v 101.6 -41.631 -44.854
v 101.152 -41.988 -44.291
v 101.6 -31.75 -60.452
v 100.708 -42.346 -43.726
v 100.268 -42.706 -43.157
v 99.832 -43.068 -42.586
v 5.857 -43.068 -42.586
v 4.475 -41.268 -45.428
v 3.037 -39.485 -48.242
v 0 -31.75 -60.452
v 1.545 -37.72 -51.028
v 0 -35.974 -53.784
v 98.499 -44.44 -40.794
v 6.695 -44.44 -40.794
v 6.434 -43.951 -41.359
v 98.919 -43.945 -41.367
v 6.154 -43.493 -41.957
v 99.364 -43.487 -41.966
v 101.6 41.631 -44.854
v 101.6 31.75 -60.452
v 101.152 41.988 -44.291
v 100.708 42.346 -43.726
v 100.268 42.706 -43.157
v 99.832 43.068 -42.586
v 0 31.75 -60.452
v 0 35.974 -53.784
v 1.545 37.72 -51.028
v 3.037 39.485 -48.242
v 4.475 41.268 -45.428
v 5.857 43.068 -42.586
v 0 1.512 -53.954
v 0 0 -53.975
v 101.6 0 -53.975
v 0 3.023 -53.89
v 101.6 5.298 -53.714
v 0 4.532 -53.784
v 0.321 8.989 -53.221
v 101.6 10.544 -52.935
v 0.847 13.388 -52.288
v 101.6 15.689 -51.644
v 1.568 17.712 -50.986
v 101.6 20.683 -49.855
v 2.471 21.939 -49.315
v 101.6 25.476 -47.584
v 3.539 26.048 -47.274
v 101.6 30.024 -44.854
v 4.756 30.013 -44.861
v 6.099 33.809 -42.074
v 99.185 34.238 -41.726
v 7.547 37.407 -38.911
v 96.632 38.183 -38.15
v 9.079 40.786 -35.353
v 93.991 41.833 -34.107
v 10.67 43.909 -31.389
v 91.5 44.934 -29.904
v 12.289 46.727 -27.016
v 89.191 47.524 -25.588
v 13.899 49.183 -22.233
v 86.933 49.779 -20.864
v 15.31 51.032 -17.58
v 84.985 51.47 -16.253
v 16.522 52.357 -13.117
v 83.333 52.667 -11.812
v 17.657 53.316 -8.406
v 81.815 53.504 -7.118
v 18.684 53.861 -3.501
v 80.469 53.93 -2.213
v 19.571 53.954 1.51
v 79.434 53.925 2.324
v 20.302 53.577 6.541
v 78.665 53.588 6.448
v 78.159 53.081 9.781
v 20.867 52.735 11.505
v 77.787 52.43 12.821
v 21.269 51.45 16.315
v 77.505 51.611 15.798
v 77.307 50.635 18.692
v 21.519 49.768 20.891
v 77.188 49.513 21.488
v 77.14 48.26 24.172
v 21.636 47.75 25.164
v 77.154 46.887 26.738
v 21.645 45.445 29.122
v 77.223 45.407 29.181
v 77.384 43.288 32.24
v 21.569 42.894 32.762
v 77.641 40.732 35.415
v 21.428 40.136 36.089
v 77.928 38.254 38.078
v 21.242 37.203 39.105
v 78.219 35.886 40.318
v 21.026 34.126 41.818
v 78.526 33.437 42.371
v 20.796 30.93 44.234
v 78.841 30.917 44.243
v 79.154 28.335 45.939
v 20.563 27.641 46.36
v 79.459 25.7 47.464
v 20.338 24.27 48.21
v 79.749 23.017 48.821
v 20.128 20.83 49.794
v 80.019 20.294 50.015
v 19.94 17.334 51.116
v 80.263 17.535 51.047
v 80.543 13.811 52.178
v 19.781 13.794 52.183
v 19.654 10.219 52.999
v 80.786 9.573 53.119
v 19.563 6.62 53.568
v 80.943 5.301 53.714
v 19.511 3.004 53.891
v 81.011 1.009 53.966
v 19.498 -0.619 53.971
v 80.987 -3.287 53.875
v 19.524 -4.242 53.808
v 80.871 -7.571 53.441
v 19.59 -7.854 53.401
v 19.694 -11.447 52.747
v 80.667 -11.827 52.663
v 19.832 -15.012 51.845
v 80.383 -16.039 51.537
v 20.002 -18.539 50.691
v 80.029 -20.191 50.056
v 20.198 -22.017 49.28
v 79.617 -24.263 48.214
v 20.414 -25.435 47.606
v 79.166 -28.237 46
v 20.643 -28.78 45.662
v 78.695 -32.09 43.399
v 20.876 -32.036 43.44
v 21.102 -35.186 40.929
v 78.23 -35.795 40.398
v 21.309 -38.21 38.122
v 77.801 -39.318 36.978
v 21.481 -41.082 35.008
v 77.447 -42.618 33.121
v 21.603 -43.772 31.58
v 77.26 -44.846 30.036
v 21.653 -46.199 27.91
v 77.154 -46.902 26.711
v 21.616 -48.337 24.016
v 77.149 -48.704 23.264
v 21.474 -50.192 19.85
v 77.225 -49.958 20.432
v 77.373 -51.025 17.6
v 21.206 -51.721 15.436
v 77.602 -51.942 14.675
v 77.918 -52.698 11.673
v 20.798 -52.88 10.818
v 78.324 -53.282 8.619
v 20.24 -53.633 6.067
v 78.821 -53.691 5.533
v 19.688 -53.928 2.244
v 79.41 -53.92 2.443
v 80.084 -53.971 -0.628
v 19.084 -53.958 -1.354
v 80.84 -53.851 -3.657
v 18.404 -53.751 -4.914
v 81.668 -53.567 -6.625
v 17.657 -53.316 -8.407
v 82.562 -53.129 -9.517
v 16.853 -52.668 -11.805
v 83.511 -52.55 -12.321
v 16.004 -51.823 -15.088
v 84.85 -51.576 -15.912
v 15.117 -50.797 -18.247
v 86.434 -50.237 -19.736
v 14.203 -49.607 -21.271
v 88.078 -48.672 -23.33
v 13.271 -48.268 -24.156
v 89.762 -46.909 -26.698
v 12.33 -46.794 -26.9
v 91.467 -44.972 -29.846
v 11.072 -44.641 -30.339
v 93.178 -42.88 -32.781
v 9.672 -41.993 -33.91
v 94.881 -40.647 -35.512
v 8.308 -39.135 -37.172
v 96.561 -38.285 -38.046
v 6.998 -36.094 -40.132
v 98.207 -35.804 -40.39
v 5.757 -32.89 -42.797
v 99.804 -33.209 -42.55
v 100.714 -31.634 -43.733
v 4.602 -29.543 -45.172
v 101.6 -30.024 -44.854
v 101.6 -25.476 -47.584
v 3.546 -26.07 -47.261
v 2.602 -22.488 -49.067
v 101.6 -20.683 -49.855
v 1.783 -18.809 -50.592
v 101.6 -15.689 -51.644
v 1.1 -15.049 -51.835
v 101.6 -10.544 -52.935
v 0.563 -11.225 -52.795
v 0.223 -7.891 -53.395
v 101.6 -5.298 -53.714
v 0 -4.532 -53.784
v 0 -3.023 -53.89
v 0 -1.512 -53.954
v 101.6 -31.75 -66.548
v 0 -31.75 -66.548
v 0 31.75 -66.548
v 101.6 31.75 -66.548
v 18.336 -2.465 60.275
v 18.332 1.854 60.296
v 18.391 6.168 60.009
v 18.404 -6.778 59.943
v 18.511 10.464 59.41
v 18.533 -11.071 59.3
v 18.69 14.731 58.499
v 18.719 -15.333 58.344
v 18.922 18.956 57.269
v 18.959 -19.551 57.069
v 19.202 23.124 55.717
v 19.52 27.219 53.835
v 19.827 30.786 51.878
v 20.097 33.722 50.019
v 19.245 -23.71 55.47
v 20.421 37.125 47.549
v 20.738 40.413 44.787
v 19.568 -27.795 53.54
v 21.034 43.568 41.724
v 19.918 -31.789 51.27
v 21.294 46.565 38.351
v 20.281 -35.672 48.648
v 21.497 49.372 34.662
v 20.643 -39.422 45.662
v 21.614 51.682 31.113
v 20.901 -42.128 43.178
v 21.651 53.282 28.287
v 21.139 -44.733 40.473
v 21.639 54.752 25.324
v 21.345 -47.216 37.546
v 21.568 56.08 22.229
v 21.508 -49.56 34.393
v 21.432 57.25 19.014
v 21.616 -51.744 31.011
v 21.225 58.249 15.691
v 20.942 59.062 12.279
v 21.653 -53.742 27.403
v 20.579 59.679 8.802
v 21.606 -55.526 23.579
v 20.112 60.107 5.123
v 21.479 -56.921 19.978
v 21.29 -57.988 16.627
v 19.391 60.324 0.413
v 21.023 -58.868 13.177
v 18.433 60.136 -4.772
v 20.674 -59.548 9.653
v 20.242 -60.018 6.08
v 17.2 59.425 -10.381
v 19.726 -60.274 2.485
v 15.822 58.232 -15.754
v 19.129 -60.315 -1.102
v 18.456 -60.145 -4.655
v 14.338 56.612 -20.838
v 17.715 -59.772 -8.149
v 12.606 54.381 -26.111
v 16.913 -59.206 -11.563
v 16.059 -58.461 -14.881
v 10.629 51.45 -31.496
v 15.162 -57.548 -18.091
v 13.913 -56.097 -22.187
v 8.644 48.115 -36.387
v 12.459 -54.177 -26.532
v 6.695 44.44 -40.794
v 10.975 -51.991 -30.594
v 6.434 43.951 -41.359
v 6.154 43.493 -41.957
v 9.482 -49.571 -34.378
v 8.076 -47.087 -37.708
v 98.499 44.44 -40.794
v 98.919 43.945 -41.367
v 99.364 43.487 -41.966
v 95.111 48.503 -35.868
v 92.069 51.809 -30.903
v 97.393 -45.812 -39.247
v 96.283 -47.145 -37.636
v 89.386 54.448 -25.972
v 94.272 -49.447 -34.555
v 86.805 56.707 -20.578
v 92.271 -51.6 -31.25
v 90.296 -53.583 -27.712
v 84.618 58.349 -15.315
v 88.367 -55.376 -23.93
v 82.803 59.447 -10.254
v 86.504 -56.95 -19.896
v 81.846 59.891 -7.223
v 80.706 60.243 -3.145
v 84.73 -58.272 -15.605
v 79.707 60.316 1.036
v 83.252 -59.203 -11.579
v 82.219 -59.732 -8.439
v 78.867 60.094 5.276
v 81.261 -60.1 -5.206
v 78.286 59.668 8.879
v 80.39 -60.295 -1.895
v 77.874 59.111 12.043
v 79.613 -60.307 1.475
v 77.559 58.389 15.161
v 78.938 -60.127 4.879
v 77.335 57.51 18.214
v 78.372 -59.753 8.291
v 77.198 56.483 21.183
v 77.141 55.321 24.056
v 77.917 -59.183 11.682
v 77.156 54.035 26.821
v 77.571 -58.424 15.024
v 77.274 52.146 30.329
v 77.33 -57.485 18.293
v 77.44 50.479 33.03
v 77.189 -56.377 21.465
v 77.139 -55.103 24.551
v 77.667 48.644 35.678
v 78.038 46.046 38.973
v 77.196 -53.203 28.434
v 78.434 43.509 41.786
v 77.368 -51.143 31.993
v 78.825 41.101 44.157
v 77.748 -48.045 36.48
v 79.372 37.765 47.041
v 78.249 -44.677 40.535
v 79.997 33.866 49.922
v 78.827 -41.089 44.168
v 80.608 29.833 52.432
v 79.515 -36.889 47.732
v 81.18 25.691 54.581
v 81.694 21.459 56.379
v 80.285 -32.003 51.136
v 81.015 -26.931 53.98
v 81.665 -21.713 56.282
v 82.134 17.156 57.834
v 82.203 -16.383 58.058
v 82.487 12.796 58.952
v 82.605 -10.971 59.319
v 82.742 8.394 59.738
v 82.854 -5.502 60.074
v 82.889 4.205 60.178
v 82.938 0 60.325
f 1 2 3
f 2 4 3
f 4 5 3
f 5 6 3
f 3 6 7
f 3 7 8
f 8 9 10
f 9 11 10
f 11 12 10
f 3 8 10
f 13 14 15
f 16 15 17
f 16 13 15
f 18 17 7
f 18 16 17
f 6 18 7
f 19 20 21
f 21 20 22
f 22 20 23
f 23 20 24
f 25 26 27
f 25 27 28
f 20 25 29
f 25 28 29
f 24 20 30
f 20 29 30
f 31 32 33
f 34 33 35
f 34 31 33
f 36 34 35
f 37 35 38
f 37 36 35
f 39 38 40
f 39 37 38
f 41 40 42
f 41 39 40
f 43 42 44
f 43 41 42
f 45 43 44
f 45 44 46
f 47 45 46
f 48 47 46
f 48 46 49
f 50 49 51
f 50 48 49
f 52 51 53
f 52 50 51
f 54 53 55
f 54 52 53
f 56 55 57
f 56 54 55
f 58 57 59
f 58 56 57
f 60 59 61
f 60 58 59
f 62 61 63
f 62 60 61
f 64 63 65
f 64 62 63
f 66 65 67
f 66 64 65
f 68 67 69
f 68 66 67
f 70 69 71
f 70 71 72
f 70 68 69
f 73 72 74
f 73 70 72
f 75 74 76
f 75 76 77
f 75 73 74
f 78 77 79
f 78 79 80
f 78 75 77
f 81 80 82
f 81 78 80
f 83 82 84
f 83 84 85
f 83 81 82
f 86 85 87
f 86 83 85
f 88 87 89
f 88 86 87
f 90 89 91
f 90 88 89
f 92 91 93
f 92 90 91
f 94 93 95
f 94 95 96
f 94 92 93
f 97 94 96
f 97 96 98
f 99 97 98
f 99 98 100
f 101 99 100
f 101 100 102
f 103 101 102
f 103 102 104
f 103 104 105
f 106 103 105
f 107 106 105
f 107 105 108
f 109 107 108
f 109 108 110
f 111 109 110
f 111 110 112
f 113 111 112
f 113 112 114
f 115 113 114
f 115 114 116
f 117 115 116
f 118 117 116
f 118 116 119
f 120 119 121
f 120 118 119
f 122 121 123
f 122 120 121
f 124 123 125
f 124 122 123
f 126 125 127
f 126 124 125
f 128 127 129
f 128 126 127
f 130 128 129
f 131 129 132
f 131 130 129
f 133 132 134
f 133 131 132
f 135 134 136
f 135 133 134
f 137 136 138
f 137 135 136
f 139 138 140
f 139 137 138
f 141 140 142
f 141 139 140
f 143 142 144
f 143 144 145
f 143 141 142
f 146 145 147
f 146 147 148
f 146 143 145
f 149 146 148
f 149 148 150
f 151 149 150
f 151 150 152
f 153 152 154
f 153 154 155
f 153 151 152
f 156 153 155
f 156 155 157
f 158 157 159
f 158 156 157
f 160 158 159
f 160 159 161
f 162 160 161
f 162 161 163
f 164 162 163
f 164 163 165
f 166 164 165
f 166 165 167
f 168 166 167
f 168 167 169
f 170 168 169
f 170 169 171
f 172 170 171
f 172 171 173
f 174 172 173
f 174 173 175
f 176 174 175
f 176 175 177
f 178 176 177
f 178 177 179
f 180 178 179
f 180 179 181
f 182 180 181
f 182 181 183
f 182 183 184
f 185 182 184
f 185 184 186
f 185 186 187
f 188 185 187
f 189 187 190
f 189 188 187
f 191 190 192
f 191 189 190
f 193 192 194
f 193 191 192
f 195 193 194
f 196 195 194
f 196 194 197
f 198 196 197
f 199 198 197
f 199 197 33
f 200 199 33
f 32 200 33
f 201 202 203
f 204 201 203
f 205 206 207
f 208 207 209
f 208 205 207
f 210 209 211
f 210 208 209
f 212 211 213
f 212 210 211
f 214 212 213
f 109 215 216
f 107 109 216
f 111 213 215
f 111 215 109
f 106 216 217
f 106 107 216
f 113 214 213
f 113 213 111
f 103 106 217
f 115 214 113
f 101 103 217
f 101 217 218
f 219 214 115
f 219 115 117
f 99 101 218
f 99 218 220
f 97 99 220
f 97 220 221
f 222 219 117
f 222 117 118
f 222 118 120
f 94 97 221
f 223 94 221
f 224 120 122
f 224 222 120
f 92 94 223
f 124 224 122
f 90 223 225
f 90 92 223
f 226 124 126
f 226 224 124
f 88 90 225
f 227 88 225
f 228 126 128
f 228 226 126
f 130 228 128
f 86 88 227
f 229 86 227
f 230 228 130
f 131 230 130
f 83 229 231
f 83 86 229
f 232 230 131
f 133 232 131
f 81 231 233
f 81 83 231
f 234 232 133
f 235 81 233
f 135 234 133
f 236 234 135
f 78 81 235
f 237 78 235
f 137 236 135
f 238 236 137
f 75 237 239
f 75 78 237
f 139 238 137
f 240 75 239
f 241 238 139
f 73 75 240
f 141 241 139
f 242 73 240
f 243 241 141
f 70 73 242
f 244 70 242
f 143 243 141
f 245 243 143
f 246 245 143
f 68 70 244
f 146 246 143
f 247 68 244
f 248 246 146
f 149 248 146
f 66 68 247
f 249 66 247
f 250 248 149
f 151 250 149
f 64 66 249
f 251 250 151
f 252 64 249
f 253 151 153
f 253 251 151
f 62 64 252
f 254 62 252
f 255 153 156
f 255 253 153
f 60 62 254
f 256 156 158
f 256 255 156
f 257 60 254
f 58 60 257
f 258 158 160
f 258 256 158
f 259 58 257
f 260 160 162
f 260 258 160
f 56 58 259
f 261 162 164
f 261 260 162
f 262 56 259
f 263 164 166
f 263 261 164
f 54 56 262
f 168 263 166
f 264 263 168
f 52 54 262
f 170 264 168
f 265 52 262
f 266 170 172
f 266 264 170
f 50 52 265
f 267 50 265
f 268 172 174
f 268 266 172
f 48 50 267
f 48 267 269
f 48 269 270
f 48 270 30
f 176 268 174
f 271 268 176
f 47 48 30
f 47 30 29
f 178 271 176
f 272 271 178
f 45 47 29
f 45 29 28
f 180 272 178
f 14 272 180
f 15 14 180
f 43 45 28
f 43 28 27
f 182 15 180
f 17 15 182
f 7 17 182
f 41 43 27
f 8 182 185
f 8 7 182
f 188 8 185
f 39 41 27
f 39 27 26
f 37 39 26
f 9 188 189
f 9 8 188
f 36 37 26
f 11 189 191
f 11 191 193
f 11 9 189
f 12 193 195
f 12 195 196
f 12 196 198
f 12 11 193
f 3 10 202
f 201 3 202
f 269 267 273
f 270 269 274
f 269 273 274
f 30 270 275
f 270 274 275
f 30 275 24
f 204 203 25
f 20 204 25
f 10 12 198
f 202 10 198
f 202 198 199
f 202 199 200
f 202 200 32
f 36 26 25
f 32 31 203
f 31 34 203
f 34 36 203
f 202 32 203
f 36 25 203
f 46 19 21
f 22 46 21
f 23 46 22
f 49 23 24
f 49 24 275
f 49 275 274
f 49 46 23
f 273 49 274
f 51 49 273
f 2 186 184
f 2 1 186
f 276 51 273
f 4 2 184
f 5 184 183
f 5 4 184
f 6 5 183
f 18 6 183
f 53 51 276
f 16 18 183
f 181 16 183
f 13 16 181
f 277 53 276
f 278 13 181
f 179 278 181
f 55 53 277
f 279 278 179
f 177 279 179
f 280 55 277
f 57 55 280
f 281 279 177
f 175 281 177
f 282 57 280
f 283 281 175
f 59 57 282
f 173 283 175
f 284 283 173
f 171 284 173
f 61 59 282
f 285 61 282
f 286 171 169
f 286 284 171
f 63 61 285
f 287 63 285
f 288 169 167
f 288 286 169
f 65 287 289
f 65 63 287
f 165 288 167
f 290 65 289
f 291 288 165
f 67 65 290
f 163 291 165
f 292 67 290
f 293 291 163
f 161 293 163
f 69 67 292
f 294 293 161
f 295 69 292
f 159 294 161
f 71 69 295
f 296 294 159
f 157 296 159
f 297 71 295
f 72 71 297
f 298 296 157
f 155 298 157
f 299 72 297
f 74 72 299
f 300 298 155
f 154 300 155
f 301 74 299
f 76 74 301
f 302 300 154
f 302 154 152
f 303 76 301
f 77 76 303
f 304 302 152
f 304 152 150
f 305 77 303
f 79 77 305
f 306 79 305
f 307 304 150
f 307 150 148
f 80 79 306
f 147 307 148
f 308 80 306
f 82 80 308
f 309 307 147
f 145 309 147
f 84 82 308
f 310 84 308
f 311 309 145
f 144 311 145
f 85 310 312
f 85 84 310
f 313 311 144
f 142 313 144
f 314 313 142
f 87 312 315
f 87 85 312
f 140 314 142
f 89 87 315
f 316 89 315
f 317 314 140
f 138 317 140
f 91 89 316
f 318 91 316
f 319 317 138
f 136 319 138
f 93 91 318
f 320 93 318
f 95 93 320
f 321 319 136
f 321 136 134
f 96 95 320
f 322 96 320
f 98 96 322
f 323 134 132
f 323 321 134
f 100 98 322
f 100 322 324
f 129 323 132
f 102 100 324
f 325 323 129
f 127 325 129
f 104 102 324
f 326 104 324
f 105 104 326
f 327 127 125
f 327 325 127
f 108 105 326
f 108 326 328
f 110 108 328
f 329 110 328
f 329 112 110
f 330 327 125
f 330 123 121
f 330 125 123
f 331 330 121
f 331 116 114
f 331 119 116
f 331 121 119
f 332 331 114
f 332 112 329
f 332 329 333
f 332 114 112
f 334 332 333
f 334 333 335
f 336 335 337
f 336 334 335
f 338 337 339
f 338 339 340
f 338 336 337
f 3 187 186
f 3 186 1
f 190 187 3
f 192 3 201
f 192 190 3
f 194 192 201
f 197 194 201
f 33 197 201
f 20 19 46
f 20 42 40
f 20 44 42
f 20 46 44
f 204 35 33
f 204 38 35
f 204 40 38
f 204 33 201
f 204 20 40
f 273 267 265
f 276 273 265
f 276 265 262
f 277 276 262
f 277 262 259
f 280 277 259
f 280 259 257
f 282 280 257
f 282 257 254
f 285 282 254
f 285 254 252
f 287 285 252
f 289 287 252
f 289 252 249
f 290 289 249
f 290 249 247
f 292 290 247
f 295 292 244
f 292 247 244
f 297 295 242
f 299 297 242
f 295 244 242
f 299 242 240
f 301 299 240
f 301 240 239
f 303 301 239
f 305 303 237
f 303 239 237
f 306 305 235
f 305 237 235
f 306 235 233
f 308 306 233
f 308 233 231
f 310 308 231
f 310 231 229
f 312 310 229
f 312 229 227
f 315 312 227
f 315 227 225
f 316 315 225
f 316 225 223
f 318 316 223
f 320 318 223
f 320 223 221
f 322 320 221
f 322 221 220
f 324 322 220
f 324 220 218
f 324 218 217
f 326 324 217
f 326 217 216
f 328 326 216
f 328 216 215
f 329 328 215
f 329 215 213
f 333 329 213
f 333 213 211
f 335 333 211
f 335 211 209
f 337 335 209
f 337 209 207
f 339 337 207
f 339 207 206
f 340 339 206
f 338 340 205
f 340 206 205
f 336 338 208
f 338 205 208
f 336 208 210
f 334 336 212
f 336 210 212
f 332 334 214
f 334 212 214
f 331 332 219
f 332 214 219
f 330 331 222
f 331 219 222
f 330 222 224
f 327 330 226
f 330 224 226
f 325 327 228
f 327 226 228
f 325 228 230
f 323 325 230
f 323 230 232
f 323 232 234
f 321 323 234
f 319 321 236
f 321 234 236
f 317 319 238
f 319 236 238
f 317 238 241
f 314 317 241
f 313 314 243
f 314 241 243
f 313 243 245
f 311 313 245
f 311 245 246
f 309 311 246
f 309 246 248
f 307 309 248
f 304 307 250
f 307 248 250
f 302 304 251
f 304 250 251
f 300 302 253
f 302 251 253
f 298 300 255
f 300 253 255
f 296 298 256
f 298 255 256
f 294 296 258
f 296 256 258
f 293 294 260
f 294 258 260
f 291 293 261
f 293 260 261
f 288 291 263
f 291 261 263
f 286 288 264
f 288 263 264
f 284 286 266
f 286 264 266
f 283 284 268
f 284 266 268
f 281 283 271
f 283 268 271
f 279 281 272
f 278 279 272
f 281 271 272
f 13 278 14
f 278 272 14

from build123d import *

# Parameters (mm, degrees)
SKETCH1_R               = 60.325
SKETCH1_R_2             = 53.975
BOSS_EXTRUDE1_DEPTH     = 101.6
FILLET3_R               = 12.7
CUT_EXTRUDE2_DEPTH      = 136.610847387
CUT_EXTRUDE2_DEPTH_BACK = 136.610847387


with BuildPart() as part:
    # Sketch1 → Boss-Extrude1 (new body)
    # profile 1 of 2: a face of its own
    with BuildSketch(Plane(origin=(0, 0, 0), x_dir=(0, 0, -1), z_dir=(1, 0, 0))):
        with BuildLine():
            Line((66.548, 31.75), (60.452, 31.75))
            Line((60.452, 31.75), (41.582779106, 43.703296292))
            ThreePointArc((41.582779106, 43.703296292), (55.441801804, 23.776295711), (60.325, 0))
            ThreePointArc((60.325, 0), (55.441801804, -23.776295711), (41.582779106, -43.703296292))
            Line((41.582779106, -43.703296292), (60.452, -31.75))
            Line((60.452, -31.75), (66.548, -31.75))
            Line((66.548, -31.75), (66.548, 31.75))
        make_face()
    # profile 2 of 2: a face of its own
    with BuildSketch(Plane(origin=(0, 0, 0), x_dir=(0, 0, -1), z_dir=(1, 0, 0))):
        Circle(SKETCH1_R)
        Circle(SKETCH1_R_2, mode=Mode.SUBTRACT)
    extrude(amount=BOSS_EXTRUDE1_DEPTH)

    # Fillet3
    fillet3_edges = [part.edges().sort_by_distance(p)[0] for p in [
        (50.8, -43.703296292, -41.582779106),
        (50.8, 43.703296292, -41.582779106),
    ]]
    fillet(fillet3_edges, radius=FILLET3_R)

    # Sketch3 → Cut-Extrude2 (cut, two sides: drawn at the far end of the back side and taken through both)
    with BuildSketch(Plane(origin=(0, 0, 0), x_dir=(1, 0, 0), z_dir=(0, 1, 0)).offset(-CUT_EXTRUDE2_DEPTH_BACK)):
        with BuildLine():
            Line((-10.157501367, 69.371411559), (-19.945541418, 96.449034115))
            Line((-19.945541418, 96.449034115), (-19.945541418, -173.768884202))
            Line((-19.945541418, -173.768884202), (157.676309373, -157.23901293))
            Line((157.676309373, -157.23901293), (148.297284667, 47.894894174))
            Line((148.297284667, 47.894894174), (143.476168145, 77.107572373))
            ThreePointArc((143.476168145, 77.107572373), (86.598799566, 20.112057795), (82.937724358, -60.325))
            Line((82.937724358, -60.325), (12.253132086, -82.144467522))
            ThreePointArc((12.253132086, -82.144467522), (19.894210891, -3.598967597), (-10.157501367, 69.371411559))
        make_face()
    extrude(amount=CUT_EXTRUDE2_DEPTH + CUT_EXTRUDE2_DEPTH_BACK, mode=Mode.SUBTRACT)


solid = part.part
